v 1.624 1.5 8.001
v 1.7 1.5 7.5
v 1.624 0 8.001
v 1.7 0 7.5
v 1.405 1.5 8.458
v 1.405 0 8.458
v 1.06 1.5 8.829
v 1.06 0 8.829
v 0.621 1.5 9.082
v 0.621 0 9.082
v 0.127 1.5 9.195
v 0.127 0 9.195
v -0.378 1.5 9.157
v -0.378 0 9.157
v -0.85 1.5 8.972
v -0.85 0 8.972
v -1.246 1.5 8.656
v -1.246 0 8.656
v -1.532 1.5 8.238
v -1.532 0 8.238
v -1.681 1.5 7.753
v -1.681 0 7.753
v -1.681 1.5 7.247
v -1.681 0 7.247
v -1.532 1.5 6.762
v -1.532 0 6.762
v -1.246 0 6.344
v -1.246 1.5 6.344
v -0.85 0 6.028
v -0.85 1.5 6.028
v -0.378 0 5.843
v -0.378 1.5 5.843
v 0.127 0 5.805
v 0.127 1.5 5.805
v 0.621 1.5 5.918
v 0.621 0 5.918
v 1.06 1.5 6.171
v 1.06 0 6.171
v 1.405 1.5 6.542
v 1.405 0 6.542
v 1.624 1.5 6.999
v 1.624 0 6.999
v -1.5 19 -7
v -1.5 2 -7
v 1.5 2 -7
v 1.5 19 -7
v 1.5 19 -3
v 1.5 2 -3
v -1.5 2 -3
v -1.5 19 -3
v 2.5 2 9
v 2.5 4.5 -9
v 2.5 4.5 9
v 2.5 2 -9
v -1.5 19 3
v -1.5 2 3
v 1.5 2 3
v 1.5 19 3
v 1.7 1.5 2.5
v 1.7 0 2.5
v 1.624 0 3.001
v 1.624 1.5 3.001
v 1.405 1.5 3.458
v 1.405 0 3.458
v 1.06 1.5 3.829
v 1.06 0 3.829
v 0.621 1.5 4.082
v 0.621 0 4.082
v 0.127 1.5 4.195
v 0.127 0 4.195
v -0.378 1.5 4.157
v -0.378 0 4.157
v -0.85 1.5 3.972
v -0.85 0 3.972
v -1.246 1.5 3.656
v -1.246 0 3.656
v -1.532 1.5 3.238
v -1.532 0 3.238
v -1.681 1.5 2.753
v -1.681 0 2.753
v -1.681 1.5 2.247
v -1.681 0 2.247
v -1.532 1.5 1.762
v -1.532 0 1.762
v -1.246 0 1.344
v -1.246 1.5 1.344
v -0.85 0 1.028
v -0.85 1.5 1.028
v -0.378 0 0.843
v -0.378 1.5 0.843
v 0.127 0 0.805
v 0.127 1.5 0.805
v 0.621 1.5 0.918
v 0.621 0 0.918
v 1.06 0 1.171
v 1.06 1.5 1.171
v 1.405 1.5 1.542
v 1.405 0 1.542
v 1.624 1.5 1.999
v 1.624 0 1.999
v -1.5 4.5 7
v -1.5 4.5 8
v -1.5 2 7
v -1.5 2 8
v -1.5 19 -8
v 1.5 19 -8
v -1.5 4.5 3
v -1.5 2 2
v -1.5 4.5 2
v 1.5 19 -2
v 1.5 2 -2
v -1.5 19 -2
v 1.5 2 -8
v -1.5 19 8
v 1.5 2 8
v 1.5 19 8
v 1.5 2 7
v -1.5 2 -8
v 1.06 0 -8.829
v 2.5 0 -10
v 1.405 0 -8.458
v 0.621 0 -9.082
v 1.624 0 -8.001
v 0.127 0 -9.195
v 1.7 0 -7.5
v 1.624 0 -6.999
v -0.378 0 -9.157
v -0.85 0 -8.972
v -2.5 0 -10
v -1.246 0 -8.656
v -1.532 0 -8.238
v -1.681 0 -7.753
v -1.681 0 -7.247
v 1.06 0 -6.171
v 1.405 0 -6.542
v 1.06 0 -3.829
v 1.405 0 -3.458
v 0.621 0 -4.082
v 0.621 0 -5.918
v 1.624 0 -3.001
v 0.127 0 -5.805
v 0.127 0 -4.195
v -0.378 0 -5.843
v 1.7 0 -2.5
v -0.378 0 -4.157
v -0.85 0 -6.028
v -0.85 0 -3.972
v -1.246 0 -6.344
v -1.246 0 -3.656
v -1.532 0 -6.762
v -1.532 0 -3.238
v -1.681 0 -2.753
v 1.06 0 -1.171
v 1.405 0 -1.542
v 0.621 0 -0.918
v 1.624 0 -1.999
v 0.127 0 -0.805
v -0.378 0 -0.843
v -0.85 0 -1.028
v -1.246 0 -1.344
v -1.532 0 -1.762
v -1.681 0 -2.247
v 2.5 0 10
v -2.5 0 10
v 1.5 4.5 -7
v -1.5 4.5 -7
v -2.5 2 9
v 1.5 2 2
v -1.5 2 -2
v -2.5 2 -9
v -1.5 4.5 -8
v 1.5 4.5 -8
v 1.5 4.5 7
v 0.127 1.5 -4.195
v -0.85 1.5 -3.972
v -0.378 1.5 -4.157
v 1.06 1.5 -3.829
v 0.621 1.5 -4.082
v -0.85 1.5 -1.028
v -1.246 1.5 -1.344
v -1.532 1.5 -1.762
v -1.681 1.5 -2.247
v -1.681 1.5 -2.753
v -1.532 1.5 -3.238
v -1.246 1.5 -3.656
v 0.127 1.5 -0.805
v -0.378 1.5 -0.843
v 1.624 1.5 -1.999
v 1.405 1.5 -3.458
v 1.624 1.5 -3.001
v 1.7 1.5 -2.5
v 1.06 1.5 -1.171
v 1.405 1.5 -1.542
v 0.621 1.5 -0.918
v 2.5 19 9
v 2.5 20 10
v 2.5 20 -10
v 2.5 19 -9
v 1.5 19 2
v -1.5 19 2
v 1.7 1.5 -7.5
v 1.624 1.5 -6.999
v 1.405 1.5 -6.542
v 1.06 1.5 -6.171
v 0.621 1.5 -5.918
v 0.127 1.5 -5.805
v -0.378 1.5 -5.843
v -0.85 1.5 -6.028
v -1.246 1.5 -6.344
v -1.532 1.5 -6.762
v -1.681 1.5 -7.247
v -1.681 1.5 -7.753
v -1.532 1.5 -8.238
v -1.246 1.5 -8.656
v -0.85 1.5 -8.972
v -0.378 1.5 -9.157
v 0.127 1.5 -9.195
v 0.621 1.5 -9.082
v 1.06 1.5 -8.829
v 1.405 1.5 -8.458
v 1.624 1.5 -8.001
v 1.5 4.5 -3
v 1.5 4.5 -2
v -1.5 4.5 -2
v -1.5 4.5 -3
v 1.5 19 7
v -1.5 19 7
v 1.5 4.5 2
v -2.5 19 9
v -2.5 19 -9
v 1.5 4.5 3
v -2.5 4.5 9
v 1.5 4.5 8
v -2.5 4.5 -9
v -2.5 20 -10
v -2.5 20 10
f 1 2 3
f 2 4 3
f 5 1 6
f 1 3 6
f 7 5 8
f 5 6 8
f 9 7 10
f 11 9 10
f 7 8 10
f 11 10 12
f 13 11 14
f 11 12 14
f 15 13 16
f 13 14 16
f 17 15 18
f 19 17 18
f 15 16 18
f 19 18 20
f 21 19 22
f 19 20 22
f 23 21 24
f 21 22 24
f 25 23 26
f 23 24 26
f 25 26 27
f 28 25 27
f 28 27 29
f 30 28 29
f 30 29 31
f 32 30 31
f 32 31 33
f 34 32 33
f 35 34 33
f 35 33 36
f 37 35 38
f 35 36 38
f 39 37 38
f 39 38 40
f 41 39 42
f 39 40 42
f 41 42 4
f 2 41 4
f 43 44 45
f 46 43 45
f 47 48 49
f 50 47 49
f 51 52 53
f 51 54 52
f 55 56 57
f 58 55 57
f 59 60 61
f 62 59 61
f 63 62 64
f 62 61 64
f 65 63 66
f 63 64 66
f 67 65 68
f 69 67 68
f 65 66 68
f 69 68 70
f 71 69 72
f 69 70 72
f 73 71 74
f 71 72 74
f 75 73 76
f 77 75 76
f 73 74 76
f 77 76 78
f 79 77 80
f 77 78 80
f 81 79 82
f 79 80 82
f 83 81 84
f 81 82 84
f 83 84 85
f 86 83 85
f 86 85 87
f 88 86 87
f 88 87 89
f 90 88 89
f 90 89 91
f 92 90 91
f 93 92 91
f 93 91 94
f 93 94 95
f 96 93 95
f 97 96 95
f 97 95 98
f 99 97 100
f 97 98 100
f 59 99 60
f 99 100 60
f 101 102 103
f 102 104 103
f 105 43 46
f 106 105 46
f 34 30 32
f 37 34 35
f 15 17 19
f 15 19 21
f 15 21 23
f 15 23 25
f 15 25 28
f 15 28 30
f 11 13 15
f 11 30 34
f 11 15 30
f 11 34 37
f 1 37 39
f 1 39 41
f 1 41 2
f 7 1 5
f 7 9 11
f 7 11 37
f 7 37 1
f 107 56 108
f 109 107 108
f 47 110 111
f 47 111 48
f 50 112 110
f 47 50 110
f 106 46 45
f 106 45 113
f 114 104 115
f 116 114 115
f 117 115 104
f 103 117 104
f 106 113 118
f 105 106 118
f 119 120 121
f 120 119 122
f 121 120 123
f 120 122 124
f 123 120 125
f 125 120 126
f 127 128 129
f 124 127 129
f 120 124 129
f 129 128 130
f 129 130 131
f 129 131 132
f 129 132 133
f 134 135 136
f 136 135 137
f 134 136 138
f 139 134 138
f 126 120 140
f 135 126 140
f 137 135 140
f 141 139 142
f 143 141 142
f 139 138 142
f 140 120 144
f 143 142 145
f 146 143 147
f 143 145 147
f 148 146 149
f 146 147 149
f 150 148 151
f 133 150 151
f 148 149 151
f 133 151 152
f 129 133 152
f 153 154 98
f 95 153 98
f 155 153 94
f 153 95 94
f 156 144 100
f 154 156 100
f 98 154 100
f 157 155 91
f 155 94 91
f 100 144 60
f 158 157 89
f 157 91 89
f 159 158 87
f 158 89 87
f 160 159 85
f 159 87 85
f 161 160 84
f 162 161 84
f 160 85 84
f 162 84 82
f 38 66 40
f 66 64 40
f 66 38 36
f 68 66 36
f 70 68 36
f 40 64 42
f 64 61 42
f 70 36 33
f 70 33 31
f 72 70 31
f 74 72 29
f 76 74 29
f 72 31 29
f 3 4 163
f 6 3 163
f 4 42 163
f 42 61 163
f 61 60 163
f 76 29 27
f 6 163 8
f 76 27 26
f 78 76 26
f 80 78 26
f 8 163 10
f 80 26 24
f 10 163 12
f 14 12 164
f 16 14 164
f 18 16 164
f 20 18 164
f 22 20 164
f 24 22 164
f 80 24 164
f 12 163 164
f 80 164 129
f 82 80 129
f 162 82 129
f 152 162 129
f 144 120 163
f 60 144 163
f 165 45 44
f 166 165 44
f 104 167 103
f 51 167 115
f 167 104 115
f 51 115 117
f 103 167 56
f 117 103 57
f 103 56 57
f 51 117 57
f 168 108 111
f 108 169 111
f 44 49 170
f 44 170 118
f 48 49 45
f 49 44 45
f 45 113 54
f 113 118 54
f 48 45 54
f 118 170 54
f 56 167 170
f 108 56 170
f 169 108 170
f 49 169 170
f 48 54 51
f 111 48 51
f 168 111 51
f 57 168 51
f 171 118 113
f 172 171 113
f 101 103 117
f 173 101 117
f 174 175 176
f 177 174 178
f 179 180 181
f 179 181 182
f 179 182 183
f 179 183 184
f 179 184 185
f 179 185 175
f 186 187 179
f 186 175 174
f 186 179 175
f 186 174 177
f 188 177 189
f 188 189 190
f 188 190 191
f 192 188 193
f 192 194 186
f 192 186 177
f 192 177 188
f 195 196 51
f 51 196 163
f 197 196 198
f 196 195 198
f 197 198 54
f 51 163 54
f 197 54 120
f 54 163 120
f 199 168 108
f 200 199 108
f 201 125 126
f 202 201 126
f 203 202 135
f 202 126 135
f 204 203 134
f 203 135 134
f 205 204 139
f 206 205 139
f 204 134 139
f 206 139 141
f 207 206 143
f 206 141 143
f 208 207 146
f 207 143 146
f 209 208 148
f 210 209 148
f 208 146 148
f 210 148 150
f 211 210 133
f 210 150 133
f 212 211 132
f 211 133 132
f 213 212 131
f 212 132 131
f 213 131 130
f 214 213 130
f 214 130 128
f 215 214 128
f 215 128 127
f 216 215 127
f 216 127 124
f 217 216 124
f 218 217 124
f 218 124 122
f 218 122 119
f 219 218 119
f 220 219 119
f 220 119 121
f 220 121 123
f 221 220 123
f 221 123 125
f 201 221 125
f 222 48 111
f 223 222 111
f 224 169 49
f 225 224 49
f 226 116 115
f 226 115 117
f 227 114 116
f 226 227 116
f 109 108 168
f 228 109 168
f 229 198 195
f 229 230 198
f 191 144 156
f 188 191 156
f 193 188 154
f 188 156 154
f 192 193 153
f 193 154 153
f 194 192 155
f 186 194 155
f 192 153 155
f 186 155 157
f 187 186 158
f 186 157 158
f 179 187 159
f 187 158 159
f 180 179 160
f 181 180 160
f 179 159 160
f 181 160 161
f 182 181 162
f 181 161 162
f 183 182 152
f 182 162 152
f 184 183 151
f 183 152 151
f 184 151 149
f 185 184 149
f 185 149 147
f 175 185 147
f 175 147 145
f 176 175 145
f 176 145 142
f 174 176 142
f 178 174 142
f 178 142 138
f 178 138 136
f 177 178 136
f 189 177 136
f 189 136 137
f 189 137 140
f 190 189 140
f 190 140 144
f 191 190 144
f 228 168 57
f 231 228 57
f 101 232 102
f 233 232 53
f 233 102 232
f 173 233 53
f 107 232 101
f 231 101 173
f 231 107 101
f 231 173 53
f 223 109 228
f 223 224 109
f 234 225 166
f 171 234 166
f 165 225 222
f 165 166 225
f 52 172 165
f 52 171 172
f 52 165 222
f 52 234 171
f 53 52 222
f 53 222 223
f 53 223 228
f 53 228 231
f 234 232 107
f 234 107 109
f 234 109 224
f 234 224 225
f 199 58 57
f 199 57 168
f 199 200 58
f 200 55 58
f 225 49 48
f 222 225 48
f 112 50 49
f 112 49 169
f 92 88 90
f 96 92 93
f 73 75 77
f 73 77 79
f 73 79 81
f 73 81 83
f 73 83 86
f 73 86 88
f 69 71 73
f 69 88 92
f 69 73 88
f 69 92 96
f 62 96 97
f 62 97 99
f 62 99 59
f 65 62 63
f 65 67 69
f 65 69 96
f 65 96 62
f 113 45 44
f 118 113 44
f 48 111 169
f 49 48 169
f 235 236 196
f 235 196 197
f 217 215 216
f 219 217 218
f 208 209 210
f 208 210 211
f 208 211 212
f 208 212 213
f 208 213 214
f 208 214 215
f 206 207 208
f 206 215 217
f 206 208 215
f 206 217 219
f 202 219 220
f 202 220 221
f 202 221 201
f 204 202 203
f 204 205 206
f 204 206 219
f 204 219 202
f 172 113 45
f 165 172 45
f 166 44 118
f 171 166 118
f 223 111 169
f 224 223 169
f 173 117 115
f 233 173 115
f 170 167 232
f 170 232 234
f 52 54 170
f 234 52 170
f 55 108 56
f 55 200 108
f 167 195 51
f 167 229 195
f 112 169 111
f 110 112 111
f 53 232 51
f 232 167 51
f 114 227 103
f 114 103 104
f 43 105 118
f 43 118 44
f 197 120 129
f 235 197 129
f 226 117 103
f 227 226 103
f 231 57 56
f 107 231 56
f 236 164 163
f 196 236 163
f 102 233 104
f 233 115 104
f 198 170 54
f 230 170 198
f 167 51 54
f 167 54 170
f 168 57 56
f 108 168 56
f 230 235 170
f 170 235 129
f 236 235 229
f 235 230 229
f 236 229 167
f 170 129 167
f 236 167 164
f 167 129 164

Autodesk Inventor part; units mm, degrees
ref_plane "YZ Plane" through (0, 0, 0) normal (1, 0, 0) x (0, 1, 0)
ref_plane "XZ Plane" through (0, 0, 0) normal (0, 1, 0) x (-1, 0, 0)
ref_plane "XY Plane" through (0, 0, 0) normal (0, 0, 1) x (1, 0, 0)
sketch "草圖1" plane through (0, 0, 0) normal (0, 1, 0) x (-1, 0, 0)
  line L0 (2.5, 10) -> (-2.5, 10)
  line L1 (-2.5, 10) -> (-2.5, -10)
  line L2 (-2.5, -10) -> (2.5, -10)
  line L3 (2.5, -10) -> (2.5, 10)
  circle A0 centre (0, 7.5) radius 1.7
  circle A1 centre (0, 2.5) radius 1.7
  circle A2 centre (0, -2.5) radius 1.7
  circle A3 centre (0, -7.5) radius 1.7
  point P0 (0, 0)
  point P1 (0, -10)
  point P2 (2.5, 0)
  dimension "d0" = 5
  dimension "d1" = 20
  dimension "d2" = 3.4
  dimension "d3" = 2.5
  dimension "d4" = 2.5
  dimension "d7" = 5
extrude "擠出1" add sketch "草圖1" along normal blind 2 contours L3 L2 L1 L0 | A0 | A1 | A2 | A3
sketch "草圖2" plane through (0, 0, 0) normal (1, 0, 0) x (0, 1, 0)
  line L0 (0, -10) -> (0, 10) projected
  line L1 (0, 10) -> (2, 10) projected
  line L2 (2, -10) -> (2, 10) projected
  line L3 (0, -10) -> (2, -10) projected
  line L4 (0, 10) -> (20, 10)
  line L5 (20, 10) -> (20, -10)
  line L6 (20, -10) -> (0, -10)
  line L7 (0, -10) -> (0, 10)
  line L8 (19, -9) -> (19, 9)
  line L9 (19, 9) -> (1, 9)
  line L10 (1, 9) -> (1, -9)
  line L11 (1, -9) -> (19, -9)
  point P0 (0, 0)
  point P1 (2, 9)
  point P2 (2, -9)
  dimension "d14" = 20
  dimension "d15" = 20
  dimension "d16" = 1
extrude "擠出2" add sketch "草圖2" along normal mid plane 5 contours L2 L11 L8 L9 L4 L5 L6
sketch "草圖3" plane through (-2.5, 19, -9) normal (0, -1, 0) x (1, 0, 0)
  line L0 (5, 19) -> (0, 19) projected
  line L1 (5, -1) -> (5, 19) projected
  line L2 (0, -1) -> (5, -1) projected
  line L3 (0, 19) -> (0, -1) projected
  line L4 (0, 19) -> (5, 19) projected
  line L5 (5, 19) -> (5, 18) projected
  line L6 (5, 18) -> (0, 18) projected
  line L7 (0, 0) -> (0, 18) projected
  line L8 (0, 0) -> (5, 0) projected
  line L9 (5, 0) -> (5, -1) projected
  line L10 (5, -1) -> (0, -1) projected
  line L11 (0, -1) -> (0, 0) projected
  line L12 (0, 18) -> (0, 19) projected
  line L13 (5, 18) -> (5, 0) projected
  line L14 (1, 17) -> (4, 17)
  line L15 (4, 17) -> (4, 16)
  line L16 (4, 16) -> (1, 16)
  line L17 (1, 16) -> (1, 17)
  line L18 (4, 11) -> (1, 11)
  line L19 (4, 12) -> (4, 11)
  line L20 (1, 12) -> (4, 12)
  line L21 (1, 11) -> (1, 12)
  line L22 (4, 6) -> (1, 6)
  line L23 (4, 7) -> (4, 6)
  line L24 (1, 7) -> (4, 7)
  line L25 (1, 6) -> (1, 7)
  line L26 (4, 1) -> (1, 1)
  line L27 (4, 2) -> (4, 1)
  line L28 (1, 2) -> (4, 2)
  line L29 (1, 1) -> (1, 2)
  point P0 (2.5, 9)
  point P1 (2.5, 17)
  point P2 (2.5, 19)
  point P3 (2.5, 12)
  point P4 (2.5, 7)
  point P5 (2.5, 2)
  dimension "d19" = 3
  dimension "d20" = 1
  dimension "d21" = 1
  dimension "d24" = 5
extrude "擠出3" add sketch "草圖3" along normal up to next separate body contours L14 L15 L16 L17 | L18 L21 L20 L19 | L22 L25 L24 L23 | L26 L29 L28 L27
sketch "草圖4" plane through (0, 2, 0) normal (0, 1, 0) x (1, 0, 0)
  line L0 (2.5, -10) -> (-2.5, -10) projected
  line L1 (-2.5, -10) -> (-2.5, -9) projected
  line L2 (-2.5, -9) -> (2.5, -9) projected
  line L3 (2.5, 9) -> (2.5, -9) projected
  line L4 (2.5, 9) -> (-2.5, 9) projected
  line L5 (-2.5, 9) -> (-2.5, 10) projected
  line L6 (-2.5, 10) -> (2.5, 10) projected
  line L7 (2.5, 10) -> (2.5, 9) projected
  line L8 (2.5, -9) -> (2.5, -10) projected
  line L9 (-2.5, -9) -> (-2.5, 9) projected
  line L10 (1.5, 2) -> (-1.5, 2) projected
  line L11 (-1.5, 2) -> (-1.5, 3) projected
  line L12 (-1.5, 3) -> (1.5, 3) projected
  line L13 (1.5, 3) -> (1.5, 2) projected
  line L14 (1.5, -7) -> (1.5, -8) projected
  line L15 (1.5, -8) -> (-1.5, -8) projected
  line L16 (-1.5, -8) -> (-1.5, -7) projected
  line L17 (-1.5, -7) -> (1.5, -7) projected
  line L18 (1.5, 7) -> (-1.5, 7) projected
  line L19 (-1.5, 7) -> (-1.5, 8) projected
  line L20 (-1.5, 8) -> (1.5, 8) projected
  line L21 (1.5, 8) -> (1.5, 7) projected
  line L22 (-1.5, -3) -> (-1.5, -2) projected
  line L23 (-1.5, -2) -> (1.5, -2) projected
  line L24 (1.5, -2) -> (1.5, -3) projected
  line L25 (1.5, -3) -> (-1.5, -3) projected
  point P0 (0, 0)
extrude "擠出4" add sketch "草圖4" along normal blind 2.5 separate body contours L2 L9 L4 L3
sketch "草圖5" plane through (0, 0, 0) normal (0, -1, 0) x (1, 0, 0)
  line L0 (-2.5, 10) -> (2.5, 10) projected
  line L1 (2.5, 10) -> (2.5, -10) projected
  line L2 (2.5, -10) -> (-2.5, -10) projected
  line L3 (-2.5, -10) -> (-2.5, 10) projected
  circle A0 centre (0, 7.5) radius 1.7
  point P0 (0, 0)
  dimension "d33" = 3.4
  dimension "d34" = 2.5
  dimension "d35" = 2.5
extrude "擠出6" cut sketch "草圖5" against normal blind 1.5 contours A0 bodies 1
pattern_linear "矩形陣列2" count 4 spacing 5 along (0, 0, -1) of "擠出6" bodies 1
properties part number "110033226_ipt_29_城堡四圓塔的窗戶"
